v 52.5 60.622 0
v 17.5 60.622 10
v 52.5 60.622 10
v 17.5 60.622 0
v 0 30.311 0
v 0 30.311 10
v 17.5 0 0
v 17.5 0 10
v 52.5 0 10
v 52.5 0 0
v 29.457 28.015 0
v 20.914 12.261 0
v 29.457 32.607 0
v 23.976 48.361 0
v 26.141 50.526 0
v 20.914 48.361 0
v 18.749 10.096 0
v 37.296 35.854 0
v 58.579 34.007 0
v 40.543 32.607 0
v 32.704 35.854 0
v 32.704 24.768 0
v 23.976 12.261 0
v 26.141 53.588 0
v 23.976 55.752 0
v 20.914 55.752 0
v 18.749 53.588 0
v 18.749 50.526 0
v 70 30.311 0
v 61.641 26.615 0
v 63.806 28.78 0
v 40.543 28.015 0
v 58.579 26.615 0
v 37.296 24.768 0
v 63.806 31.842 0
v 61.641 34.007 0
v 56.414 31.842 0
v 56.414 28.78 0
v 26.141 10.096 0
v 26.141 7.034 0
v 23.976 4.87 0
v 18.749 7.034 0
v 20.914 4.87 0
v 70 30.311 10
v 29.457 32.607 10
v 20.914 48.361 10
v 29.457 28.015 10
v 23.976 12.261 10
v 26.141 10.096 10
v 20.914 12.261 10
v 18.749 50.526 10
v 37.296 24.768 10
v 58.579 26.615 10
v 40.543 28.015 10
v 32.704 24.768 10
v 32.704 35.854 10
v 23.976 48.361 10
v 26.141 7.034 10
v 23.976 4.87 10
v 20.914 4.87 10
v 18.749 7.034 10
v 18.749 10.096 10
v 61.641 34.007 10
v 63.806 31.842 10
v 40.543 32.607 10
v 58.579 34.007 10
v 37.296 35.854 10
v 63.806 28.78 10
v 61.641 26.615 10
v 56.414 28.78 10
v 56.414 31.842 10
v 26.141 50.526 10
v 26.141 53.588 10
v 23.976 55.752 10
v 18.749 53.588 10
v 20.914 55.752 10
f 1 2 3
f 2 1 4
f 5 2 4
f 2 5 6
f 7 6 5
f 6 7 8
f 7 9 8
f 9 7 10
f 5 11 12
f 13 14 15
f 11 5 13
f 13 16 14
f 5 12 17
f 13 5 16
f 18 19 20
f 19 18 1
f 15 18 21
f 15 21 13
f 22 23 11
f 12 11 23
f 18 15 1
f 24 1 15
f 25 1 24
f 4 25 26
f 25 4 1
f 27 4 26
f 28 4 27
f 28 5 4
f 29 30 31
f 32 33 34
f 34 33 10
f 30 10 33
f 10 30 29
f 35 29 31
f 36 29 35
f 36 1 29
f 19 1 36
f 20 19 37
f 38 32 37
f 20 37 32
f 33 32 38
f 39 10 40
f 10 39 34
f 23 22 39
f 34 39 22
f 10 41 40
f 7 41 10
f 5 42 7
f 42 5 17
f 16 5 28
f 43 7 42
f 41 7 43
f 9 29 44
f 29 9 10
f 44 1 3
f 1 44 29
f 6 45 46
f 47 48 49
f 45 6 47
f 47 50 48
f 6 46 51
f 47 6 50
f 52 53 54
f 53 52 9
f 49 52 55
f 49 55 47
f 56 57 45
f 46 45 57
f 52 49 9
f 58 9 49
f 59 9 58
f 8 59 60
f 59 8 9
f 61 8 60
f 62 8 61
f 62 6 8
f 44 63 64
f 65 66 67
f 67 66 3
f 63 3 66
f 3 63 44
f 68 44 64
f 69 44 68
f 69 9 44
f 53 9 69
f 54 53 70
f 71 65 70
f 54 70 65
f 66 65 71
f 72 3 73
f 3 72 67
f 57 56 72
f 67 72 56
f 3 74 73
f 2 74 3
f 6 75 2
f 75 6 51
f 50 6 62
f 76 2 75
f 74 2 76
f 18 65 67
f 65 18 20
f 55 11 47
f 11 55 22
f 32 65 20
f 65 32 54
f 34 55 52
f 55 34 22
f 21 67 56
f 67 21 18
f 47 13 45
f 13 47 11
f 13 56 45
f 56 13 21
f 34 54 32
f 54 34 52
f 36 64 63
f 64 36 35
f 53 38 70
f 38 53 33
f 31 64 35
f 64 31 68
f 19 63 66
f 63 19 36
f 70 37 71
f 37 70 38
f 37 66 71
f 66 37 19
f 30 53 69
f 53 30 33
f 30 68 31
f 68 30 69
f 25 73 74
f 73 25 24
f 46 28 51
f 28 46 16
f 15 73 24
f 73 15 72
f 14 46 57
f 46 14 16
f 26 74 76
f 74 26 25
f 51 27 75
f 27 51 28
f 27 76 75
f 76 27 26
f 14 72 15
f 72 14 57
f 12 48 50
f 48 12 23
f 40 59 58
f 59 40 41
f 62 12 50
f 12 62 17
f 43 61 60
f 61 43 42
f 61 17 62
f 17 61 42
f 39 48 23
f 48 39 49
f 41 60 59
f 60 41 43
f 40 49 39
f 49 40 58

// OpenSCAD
$fn = 32;

// ----------------------------------------------------------------------
// Polygon plate: 6-gon R35, 3 bolt windows
// ----------------------------------------------------------------------

// --- parameters (mm) ---
sides = 6;                // number of polygon sides
plate_r = 35;             // circumscribed radius of the polygon
bore_r = 6;               // centre bore radius
bolts = 3;                // number of bolt windows
ring_r = 25.11;           // bolt-circle radius
bolt_r = 4;               // bolt window radius
plate_t = 10;             // plate thickness, Z (extrusion height)

plate_d = 2 * plate_r;  // circumscribed diameter
bore_d = 2 * bore_r;  // centre bore diameter
bolt_d = 2 * bolt_r;  // bolt window diameter
ring_d = 2 * ring_r;  // bolt-circle diameter

profile = [[70, 30.311], [52.5, 60.622], [17.5, 60.622], [0, 30.311], [17.5, 0], [52.5, 0]];  // primary outline, 6 points, counter clockwise
void_1 = [[40.543, 32.607], [37.296, 35.854], [32.704, 35.854], [29.457, 32.607], [29.457, 28.015], [32.704, 24.768], [37.296, 24.768], [40.543, 28.015]];  // centre bore, 8 points
void_2 = [[63.806, 31.842], [61.641, 34.007], [58.579, 34.007], [56.414, 31.842], [56.414, 28.78], [58.579, 26.615], [61.641, 26.615], [63.806, 28.78]];  // bolt window 1, 8 points
void_3 = [[26.141, 53.588], [23.976, 55.752], [20.914, 55.752], [18.749, 53.588], [18.749, 50.526], [20.914, 48.361], [23.976, 48.361], [26.141, 50.526]];  // bolt window 2, 8 points
void_4 = [[26.141, 10.096], [23.976, 12.261], [20.914, 12.261], [18.749, 10.096], [18.749, 7.034], [20.914, 4.87], [23.976, 4.87], [26.141, 7.034]];  // bolt window 3, 8 points

// --- the one profile operation ---
difference() {
  linear_extrude(height = plate_t) polygon(points = profile);
  translate([0, 0, -1])
    linear_extrude(height = plate_t + 2) polygon(points = void_1);
  translate([0, 0, -1])
    linear_extrude(height = plate_t + 2) polygon(points = void_2);
  translate([0, 0, -1])
    linear_extrude(height = plate_t + 2) polygon(points = void_3);
  translate([0, 0, -1])
    linear_extrude(height = plate_t + 2) polygon(points = void_4);
}
